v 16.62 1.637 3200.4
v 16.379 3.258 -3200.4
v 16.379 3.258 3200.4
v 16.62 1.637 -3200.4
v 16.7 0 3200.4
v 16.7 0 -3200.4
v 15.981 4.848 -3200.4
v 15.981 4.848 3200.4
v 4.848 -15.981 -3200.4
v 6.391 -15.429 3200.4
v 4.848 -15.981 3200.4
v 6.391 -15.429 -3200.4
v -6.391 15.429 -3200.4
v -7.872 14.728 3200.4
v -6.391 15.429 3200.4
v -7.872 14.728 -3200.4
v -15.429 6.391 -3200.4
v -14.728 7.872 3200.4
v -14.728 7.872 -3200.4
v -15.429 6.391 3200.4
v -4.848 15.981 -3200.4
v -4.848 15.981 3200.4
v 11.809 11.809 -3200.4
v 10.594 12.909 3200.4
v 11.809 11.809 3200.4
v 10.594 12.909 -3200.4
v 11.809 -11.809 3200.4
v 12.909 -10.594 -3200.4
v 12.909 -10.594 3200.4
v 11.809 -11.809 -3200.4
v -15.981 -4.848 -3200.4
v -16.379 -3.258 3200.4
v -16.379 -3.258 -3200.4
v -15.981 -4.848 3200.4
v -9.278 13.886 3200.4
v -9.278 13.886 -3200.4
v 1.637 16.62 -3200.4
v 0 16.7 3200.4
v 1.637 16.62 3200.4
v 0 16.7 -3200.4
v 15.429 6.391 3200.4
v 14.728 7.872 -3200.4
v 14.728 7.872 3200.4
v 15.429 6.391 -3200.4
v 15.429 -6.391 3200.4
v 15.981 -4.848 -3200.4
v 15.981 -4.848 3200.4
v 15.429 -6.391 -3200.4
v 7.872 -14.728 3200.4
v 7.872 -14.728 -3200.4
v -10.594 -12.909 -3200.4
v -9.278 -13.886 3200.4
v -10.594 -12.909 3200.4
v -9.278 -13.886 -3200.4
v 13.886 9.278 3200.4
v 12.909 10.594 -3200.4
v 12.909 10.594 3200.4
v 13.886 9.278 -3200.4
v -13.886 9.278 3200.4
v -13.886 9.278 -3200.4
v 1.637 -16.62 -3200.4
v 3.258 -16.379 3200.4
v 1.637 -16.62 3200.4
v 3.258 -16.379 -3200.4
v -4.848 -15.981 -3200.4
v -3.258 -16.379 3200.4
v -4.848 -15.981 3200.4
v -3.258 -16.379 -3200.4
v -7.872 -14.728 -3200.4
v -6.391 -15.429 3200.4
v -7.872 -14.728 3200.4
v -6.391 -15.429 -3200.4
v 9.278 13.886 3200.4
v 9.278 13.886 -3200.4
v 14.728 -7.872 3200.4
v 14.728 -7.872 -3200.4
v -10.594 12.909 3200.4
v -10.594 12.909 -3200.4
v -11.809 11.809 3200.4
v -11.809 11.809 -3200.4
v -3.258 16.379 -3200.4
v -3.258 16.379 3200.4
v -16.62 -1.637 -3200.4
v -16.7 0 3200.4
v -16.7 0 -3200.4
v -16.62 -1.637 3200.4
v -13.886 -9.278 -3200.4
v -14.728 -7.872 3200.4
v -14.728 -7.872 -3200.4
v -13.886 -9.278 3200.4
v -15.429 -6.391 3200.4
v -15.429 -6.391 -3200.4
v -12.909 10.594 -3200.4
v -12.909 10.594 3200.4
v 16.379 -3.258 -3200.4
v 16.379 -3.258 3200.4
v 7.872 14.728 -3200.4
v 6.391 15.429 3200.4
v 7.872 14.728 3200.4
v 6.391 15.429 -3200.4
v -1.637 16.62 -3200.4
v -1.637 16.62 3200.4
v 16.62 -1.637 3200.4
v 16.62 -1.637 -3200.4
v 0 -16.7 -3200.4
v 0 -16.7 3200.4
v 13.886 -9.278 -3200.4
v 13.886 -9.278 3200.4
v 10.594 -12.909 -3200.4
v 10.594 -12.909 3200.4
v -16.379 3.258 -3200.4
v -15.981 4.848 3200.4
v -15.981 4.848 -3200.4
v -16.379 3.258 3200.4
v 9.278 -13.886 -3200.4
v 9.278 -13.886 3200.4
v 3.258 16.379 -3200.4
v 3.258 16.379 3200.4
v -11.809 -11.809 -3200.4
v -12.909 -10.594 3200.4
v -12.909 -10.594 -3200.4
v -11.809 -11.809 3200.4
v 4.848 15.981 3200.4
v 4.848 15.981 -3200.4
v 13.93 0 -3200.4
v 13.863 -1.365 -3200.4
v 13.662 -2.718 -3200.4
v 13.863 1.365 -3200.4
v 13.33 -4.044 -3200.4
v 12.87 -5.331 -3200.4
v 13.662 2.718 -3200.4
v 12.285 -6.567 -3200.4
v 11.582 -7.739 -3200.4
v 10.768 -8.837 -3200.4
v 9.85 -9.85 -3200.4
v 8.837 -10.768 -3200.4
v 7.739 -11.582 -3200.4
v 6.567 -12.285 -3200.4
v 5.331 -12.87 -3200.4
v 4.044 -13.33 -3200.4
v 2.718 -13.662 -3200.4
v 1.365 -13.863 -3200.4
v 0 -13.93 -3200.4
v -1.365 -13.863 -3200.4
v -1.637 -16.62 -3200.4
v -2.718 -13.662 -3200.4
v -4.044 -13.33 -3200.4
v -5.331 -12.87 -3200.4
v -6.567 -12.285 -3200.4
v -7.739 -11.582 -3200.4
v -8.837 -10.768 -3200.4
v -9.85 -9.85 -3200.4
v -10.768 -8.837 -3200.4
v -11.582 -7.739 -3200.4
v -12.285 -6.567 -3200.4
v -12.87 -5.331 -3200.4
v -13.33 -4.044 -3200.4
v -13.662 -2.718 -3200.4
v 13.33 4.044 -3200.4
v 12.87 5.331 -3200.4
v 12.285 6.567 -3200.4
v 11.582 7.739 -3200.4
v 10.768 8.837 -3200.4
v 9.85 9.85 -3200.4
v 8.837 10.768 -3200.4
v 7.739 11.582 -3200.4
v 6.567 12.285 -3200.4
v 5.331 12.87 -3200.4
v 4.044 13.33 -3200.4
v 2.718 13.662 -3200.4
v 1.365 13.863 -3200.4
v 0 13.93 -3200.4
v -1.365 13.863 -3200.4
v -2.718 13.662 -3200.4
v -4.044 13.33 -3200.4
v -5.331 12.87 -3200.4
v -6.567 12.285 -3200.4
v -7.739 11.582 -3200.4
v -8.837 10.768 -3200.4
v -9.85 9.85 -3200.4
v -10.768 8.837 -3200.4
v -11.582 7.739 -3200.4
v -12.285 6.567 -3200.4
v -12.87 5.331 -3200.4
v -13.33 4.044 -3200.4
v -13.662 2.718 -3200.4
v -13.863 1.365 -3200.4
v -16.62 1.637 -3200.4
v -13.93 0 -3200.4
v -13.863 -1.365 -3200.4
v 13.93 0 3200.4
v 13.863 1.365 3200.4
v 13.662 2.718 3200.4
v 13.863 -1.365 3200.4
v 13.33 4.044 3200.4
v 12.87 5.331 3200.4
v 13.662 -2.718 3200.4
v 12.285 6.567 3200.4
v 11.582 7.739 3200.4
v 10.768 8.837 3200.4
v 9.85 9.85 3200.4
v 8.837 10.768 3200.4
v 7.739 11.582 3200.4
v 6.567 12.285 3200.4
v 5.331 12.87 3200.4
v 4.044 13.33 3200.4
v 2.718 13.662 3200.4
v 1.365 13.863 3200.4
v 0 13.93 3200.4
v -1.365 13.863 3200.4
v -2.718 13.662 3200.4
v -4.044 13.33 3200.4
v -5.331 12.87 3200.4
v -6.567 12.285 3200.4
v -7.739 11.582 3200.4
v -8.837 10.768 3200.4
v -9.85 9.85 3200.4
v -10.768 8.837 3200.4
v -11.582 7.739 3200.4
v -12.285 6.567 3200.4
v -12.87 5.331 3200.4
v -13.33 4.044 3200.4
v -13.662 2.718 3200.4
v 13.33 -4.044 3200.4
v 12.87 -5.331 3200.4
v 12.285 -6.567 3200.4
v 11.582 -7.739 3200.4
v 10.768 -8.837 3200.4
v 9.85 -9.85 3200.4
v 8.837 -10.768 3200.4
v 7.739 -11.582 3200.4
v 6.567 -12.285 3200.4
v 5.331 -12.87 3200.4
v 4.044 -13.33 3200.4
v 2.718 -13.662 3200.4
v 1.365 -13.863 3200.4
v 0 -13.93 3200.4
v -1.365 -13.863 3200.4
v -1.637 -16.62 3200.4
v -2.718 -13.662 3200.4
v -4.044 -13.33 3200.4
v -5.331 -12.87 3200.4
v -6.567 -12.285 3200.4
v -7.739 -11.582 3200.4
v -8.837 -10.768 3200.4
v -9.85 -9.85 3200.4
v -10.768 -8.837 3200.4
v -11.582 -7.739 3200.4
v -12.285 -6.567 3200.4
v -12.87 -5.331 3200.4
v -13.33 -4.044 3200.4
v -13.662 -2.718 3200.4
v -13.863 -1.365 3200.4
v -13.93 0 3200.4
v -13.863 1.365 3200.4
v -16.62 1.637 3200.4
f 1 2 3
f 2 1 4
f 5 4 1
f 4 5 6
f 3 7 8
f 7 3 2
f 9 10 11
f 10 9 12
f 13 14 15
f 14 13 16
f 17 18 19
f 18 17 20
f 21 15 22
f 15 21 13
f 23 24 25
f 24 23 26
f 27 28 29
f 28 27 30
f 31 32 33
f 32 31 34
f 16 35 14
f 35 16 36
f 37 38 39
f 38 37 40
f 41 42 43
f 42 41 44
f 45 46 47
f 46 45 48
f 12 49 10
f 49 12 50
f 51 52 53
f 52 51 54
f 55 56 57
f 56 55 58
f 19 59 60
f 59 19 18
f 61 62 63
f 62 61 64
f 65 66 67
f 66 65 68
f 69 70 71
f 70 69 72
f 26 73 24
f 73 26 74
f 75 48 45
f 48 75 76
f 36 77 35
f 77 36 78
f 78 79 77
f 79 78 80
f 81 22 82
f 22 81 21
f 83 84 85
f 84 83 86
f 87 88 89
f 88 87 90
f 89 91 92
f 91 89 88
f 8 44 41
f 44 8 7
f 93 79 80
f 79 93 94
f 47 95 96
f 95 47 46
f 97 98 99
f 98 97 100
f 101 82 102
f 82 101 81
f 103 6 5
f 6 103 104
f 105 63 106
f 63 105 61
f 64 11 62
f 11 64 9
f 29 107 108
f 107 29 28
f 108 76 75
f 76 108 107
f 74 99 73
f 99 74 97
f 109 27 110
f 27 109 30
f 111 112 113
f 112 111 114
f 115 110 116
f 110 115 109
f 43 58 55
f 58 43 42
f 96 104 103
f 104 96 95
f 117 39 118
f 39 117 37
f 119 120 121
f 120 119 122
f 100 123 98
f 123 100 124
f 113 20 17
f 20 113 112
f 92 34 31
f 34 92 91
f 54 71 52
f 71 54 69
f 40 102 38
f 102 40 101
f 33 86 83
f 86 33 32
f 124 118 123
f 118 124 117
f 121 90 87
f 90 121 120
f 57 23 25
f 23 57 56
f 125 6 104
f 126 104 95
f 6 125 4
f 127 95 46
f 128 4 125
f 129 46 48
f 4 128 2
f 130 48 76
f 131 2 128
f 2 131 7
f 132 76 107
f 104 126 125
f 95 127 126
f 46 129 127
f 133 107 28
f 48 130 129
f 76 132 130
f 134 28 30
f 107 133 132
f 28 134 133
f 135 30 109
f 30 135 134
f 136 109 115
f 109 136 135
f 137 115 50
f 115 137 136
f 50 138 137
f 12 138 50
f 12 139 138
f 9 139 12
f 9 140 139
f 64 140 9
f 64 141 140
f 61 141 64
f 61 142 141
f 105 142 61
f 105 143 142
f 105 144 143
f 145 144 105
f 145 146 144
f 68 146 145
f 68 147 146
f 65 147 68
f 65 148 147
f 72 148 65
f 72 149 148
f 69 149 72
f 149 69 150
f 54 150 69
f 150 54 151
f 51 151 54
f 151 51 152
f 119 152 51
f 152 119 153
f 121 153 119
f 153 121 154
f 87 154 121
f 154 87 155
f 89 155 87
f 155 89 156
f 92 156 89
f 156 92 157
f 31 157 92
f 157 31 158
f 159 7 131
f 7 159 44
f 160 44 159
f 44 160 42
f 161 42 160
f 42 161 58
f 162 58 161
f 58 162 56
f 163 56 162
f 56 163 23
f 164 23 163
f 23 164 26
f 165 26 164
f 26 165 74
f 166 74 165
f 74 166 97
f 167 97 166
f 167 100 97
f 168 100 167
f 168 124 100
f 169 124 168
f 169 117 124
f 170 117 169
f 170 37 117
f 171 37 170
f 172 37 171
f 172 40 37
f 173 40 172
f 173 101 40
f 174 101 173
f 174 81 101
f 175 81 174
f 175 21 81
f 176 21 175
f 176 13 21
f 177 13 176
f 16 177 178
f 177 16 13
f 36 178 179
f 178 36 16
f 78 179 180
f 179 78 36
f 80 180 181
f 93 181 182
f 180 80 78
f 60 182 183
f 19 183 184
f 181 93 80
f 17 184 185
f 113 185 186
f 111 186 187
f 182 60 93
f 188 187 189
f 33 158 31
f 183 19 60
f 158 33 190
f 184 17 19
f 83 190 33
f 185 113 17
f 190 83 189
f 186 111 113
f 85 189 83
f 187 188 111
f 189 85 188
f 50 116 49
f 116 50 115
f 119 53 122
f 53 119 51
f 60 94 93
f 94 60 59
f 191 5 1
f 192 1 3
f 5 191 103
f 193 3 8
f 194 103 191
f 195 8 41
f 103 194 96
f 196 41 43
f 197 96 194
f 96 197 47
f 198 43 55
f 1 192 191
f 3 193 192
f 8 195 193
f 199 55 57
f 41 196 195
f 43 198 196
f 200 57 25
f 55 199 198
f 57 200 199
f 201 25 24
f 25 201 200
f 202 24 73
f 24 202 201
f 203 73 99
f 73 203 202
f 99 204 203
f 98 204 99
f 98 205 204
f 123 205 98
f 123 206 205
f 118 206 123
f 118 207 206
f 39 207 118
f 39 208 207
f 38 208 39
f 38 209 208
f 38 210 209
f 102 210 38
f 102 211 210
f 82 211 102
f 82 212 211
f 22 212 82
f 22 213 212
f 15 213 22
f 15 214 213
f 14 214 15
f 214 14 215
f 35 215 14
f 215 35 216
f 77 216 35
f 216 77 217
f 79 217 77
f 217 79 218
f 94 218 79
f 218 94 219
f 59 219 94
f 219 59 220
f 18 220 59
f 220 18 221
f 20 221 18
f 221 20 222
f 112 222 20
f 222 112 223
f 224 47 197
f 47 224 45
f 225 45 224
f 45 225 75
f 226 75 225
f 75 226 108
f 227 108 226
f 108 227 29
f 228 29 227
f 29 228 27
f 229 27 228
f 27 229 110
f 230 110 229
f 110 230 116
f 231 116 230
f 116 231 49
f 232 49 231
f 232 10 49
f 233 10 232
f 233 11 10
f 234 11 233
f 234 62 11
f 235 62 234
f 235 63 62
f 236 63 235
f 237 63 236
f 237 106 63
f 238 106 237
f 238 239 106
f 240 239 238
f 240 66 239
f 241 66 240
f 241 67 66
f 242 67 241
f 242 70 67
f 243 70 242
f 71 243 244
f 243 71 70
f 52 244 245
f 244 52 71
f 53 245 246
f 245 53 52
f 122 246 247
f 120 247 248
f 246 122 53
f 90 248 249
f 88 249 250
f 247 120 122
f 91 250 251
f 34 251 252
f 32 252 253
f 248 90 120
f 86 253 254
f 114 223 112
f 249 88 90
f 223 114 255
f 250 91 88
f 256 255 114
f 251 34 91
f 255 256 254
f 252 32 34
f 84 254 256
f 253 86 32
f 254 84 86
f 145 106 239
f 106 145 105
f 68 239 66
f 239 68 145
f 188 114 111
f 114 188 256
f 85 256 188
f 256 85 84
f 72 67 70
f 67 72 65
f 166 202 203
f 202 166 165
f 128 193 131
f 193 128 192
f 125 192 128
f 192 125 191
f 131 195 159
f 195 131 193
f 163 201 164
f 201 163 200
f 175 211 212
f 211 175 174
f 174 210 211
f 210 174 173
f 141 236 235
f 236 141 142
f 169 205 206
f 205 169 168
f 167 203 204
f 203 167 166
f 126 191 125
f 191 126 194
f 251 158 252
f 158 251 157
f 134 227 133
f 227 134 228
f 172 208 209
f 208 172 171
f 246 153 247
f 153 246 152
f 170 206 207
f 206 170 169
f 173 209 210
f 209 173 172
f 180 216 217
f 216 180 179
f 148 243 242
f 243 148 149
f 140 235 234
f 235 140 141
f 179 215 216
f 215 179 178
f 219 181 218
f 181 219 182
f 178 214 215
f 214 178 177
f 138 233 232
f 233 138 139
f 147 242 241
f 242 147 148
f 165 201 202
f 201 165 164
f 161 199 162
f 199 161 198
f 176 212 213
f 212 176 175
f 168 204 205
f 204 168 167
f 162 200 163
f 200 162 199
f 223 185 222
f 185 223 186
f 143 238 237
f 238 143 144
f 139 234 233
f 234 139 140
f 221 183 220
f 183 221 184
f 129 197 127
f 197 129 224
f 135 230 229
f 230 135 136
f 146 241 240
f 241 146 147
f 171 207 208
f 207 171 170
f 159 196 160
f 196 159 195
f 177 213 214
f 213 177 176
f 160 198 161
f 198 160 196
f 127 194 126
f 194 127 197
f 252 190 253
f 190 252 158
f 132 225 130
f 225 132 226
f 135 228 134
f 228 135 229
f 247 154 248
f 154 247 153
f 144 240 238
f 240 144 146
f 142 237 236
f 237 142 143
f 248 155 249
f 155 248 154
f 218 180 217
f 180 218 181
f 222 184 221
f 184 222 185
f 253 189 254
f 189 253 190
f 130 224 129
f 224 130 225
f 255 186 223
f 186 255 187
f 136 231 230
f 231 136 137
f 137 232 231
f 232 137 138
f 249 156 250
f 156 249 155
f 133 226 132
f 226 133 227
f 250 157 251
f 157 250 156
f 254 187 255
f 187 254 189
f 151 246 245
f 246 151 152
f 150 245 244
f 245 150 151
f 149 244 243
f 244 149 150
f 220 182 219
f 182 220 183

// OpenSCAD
// Auto-generated by scripts/author_from_manifest.py (Phase D.3).
// Source: data/phase_d_manifest.json (sku_intent='wheatland-sch40-black-1in-21ft').
// Do not hand-edit — regenerate from the manifest.
//
// @part wheatland_sch40_black_1in_21ft
// @kind pipe_segment
// @category pipe.sch40.black.steel
// @display-name "Sch40 Black Steel 1\" x 21ft"
// @mfg wheatland_tube
// @price-usd 14.50
// @install-minutes 4
// @crew journeyman
// @param size_in number default=1 label="Size" unit="in"
// @port inlet position=[0,0,-0.5] direction=[0,0,-1] style=grooved size_in=1 role=run_a
// @port outlet position=[0,0,0.5] direction=[0,0,1] style=grooved size_in=1 role=run_b

size_in  = 1.0;
length_m = 6.4008;
schedule = "sch10";

function od_mm(nps) =
    nps ==  0.75 ? 26.7 :
    nps ==   1  ? 33.4 :
    nps == 1.25 ? 42.2 :
    nps == 1.5  ? 48.3 :
    nps ==   2  ? 60.3 :
    nps == 2.5  ? 73.0 :
    nps ==   3  ? 88.9 :
    nps ==   4  ? 114.3 :
    nps ==   5  ? 141.3 :
    nps ==   6  ? 168.3 :
    nps ==   8  ? 219.1 :
    nps ==  10  ? 273.0 : 60.3;

function wall_mm(nps, sched) =
    sched == "sch40"
        ? (nps <= 1.5 ? 3.68 : nps <= 3 ? 5.49 : 6.02)
        : (nps <= 1.5 ? 2.77 : nps <= 3 ? 3.05 : 3.68);

od = od_mm(size_in);
id = od - 2 * wall_mm(size_in, schedule);
len_mm = length_m * 1000;

difference() {
    cylinder(h = len_mm, d = od, center = true, $fn = 64);
    cylinder(h = len_mm + 1, d = id, center = true, $fn = 64);
}
